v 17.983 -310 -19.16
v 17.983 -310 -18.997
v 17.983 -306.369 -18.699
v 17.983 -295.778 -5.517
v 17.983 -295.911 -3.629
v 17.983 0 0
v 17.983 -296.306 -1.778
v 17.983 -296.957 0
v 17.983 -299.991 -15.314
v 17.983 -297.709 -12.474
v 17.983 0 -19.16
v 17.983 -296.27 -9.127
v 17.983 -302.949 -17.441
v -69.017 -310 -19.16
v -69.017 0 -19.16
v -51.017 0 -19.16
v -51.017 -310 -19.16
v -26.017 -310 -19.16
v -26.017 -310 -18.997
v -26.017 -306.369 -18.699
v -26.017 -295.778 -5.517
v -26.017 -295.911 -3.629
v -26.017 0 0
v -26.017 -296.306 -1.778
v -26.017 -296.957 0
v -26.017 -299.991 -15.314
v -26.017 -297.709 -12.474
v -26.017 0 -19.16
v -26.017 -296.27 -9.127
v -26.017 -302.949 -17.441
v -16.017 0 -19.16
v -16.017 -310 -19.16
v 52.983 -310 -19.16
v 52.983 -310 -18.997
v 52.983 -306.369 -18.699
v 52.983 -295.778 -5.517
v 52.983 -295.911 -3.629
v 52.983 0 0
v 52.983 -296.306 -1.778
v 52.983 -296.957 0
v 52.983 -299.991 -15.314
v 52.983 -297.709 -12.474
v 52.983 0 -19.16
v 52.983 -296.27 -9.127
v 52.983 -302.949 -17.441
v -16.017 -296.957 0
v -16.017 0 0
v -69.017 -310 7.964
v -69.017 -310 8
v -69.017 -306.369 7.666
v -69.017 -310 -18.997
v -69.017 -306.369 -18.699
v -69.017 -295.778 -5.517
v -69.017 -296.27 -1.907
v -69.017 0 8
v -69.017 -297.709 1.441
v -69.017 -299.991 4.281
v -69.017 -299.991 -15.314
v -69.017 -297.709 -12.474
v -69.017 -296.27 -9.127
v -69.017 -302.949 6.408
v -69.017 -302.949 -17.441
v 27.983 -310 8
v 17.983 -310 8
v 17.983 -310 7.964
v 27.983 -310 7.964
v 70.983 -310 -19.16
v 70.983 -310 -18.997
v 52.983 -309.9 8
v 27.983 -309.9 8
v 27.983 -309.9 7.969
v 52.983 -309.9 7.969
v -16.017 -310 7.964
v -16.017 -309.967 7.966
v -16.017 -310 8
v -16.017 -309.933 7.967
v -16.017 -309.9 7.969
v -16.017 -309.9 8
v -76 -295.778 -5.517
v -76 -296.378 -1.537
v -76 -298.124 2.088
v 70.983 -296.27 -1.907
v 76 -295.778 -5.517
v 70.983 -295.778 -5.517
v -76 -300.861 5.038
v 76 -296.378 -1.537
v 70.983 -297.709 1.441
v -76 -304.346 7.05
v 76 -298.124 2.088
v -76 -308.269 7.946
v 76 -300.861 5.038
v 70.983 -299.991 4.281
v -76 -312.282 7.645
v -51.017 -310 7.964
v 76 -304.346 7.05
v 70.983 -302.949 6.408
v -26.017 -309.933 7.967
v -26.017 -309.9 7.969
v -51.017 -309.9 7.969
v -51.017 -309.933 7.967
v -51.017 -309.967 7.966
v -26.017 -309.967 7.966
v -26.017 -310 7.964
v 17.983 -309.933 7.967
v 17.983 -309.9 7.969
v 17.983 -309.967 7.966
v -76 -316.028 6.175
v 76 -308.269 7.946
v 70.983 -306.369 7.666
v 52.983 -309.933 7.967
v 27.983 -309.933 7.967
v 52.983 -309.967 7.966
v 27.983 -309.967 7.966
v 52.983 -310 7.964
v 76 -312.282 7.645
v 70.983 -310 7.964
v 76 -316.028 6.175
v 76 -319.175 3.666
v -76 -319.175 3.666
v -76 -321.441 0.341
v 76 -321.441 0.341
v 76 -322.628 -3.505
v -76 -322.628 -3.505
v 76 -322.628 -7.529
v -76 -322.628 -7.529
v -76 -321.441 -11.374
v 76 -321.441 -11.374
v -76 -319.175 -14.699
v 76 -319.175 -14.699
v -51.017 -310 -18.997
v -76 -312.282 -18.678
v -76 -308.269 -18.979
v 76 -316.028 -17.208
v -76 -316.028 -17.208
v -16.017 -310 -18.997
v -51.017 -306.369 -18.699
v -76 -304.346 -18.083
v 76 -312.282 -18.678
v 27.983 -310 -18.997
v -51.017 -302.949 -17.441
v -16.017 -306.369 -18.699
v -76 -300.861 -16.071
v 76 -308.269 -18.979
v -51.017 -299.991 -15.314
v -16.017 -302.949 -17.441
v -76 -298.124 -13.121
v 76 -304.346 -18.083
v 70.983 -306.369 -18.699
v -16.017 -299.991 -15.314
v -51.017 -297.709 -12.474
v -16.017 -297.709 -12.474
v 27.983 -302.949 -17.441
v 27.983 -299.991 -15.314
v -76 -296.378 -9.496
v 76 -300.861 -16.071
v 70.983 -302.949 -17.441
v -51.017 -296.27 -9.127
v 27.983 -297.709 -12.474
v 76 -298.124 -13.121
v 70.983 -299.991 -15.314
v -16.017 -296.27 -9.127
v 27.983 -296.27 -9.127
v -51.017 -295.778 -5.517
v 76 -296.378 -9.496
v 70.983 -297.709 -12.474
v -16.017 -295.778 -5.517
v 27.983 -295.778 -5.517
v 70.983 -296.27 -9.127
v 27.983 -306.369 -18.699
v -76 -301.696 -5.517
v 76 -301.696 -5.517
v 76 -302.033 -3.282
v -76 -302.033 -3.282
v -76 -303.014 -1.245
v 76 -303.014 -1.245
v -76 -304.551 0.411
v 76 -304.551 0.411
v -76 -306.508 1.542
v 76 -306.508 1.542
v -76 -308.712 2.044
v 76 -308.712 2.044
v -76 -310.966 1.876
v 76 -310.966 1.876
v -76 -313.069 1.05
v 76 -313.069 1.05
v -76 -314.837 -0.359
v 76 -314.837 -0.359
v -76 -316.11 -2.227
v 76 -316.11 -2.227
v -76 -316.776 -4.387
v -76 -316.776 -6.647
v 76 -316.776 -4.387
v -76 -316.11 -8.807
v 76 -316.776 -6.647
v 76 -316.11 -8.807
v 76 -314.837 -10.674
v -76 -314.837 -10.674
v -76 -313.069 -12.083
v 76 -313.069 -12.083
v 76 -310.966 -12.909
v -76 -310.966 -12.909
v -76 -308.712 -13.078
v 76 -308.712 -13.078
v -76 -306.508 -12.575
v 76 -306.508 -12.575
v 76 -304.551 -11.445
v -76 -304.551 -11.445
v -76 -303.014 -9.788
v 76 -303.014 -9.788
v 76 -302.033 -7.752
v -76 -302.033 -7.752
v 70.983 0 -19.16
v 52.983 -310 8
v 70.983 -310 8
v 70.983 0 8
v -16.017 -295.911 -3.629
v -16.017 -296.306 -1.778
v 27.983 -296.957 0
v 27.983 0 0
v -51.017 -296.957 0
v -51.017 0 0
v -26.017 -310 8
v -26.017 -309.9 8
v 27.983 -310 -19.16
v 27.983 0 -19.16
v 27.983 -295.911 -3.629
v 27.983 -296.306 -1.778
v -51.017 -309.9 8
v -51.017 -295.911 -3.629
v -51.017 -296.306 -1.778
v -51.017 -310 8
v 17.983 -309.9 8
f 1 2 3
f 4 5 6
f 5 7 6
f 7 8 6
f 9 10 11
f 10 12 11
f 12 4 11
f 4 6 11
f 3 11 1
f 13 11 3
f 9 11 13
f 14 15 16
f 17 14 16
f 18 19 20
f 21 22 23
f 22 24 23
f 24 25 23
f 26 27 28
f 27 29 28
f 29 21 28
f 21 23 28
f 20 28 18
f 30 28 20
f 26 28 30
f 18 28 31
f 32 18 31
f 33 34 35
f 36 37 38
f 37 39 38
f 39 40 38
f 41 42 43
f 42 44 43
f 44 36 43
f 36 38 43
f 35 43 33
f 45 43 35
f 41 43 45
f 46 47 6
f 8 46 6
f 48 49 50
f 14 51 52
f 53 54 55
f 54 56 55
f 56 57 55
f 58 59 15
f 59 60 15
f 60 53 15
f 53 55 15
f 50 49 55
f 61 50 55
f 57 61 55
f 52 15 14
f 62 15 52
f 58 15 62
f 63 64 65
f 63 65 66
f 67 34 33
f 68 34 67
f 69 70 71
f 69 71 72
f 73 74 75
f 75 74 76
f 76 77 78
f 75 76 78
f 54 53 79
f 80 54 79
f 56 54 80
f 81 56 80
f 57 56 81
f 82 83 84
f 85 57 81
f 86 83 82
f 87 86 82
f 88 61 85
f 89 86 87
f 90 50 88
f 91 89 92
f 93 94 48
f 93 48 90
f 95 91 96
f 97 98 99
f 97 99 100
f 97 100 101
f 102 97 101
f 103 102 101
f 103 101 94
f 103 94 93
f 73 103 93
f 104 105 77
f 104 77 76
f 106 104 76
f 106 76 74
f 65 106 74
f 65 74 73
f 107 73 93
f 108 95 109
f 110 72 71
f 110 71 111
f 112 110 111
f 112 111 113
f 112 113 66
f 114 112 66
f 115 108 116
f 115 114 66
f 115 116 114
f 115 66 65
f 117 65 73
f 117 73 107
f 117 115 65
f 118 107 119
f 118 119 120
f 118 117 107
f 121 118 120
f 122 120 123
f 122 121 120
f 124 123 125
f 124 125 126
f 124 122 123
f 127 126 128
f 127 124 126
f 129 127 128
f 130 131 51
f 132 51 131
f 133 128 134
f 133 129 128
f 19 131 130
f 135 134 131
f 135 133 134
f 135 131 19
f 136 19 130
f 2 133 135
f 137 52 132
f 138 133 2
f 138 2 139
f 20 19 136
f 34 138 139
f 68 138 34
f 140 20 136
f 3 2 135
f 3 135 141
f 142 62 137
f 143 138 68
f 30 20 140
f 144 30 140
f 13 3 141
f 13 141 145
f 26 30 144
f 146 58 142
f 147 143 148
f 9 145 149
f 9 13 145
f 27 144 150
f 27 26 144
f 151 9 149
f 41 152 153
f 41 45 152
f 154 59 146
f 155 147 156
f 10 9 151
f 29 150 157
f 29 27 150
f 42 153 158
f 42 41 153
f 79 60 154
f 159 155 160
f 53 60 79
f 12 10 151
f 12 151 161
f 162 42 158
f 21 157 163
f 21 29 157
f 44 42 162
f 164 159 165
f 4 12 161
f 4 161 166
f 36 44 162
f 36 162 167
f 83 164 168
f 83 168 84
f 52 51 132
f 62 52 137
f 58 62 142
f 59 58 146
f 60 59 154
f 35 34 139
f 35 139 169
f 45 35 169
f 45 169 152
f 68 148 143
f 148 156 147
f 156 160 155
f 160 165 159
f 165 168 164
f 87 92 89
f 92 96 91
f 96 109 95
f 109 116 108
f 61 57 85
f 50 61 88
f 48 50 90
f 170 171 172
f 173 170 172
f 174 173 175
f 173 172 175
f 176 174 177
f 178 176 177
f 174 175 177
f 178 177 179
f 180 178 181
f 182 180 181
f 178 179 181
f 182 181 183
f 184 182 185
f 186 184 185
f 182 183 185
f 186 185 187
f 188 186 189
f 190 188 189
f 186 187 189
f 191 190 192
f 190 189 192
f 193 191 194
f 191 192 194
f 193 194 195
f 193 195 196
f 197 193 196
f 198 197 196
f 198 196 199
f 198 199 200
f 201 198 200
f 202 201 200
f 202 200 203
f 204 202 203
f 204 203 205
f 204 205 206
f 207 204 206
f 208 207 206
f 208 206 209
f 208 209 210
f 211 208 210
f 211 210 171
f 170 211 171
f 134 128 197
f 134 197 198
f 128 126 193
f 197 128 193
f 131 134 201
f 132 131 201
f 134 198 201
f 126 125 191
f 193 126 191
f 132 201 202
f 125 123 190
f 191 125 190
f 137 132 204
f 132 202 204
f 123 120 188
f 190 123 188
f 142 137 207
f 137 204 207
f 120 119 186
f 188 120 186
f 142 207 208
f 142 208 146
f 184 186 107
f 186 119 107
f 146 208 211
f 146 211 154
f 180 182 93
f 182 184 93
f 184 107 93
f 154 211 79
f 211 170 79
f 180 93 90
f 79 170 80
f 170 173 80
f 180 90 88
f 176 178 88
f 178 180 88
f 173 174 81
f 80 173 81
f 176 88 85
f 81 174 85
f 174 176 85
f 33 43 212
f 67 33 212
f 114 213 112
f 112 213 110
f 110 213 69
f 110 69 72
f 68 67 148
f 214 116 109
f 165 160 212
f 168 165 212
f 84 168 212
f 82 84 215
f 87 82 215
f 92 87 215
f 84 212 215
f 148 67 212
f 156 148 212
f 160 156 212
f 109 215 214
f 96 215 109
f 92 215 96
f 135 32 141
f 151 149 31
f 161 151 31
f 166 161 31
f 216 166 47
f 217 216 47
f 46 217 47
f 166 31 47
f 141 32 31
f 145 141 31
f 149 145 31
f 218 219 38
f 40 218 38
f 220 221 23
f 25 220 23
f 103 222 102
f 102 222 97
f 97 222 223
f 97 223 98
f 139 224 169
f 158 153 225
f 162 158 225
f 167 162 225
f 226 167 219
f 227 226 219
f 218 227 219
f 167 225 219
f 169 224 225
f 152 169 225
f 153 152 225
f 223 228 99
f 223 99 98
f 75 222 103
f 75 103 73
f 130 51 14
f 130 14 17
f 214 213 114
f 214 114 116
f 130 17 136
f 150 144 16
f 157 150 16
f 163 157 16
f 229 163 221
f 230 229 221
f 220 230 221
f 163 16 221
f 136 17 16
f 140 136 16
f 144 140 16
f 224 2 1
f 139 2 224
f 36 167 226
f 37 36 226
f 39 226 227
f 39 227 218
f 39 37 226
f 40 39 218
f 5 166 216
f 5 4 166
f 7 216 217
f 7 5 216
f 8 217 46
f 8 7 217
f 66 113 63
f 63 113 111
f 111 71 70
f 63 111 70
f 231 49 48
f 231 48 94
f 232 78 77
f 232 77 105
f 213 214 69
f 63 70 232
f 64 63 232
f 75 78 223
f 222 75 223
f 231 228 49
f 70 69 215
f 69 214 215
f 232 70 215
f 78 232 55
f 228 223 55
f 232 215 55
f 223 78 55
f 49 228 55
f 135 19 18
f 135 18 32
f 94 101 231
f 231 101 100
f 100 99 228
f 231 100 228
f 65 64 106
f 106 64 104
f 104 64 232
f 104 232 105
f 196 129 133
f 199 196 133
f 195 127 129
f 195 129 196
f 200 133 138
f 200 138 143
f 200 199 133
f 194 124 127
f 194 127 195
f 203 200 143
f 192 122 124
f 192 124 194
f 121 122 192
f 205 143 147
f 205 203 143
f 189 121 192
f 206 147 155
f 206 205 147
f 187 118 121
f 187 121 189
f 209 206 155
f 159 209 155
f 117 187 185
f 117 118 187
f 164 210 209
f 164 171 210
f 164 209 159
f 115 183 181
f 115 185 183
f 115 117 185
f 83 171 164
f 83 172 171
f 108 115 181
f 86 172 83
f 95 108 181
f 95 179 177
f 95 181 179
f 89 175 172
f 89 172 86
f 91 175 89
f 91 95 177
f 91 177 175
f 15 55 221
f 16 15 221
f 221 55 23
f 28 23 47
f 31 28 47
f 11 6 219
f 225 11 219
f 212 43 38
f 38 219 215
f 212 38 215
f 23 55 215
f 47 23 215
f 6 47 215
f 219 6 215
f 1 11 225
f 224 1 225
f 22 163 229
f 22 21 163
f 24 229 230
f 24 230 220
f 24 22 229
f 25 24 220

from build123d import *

# Parameters (mm, degrees)
F1_DEPTH = 310
F0_W     = 34
F0_H     = 8
F2_DEPTH = 250
F3_DEPTH = 310
F0_W_2   = 25
F4_DEPTH = 309.9
F5_R     = 13.5
F6_DEPTH = 76
F7_R     = 7.58231
F8_DEPTH = 325


with BuildPart() as f1:
    # F0 (on Front) → F1 (new body)
    with BuildSketch(Plane.XZ):
        Polygon((70.983323, 8), (52.983323, 8), (52.983323, 0), (52.983323, -19.15983), (70.983323, -19.15983), (70.983323, 3.84017), align=None)
        Polygon((-69.016677, -19.15983), (-51.016677, -19.15983), (-51.016677, 0), (-51.016677, 8), (-69.016677, 8), (-69.016677, 3.84017), align=None)
    extrude(amount=F1_DEPTH)



with BuildPart() as f2:
    # F0 (on Front) → F2 (new body)
    with BuildSketch(Plane.XZ):
        with Locations((0.983323, 4)):
            Rectangle(F0_W, F0_H)
    extrude(amount=F2_DEPTH)

    # F0 (on Front) → F3 (join)
    with BuildSketch(Plane.XZ):
        Polygon((-26.016677, 8), (-26.016677, 0), (-26.016677, -19.15983), (-16.016677, -19.15983), (-16.016677, 0), (-16.016677, 8), align=None)
        Polygon((27.983323, 8), (17.983323, 8), (17.983323, 0), (17.983323, -19.15983), (27.983323, -19.15983), (27.983323, 0), align=None)
    extrude(amount=F3_DEPTH)


with BuildPart() as f4:
    # F0 (on Front) → F4 (new body)
    with BuildSketch(Plane.XZ):
        with Locations((-38.516677, 4)):
            Rectangle(F0_W_2, F0_H)
        with Locations((40.483323, 4)):
            Rectangle(F0_W_2, F0_H)
        with Locations((0.983323, 4)):
            Rectangle(F0_W, F0_H)
    extrude(amount=F4_DEPTH)


with BuildPart() as f1_1:
    add(f1.part)

    add(f2.part)  # F6 merges F2

    add(f4.part)  # F6 merges F4
    # F5 (on Right) → F6 (join, symmetric)
    with BuildSketch(Plane.YZ):
        with Locations((-309.278336, -5.516672)):
            Circle(F5_R)
    extrude(amount=F6_DEPTH, both=True)

    # F7 (on face) → F8 (cut)
    with BuildSketch(Plane.YZ.offset(76)):
        with Locations((-309.278336, -5.516672)):
            Circle(F7_R)
    extrude(amount=-F8_DEPTH, mode=Mode.SUBTRACT)


solid = f1_1.part
